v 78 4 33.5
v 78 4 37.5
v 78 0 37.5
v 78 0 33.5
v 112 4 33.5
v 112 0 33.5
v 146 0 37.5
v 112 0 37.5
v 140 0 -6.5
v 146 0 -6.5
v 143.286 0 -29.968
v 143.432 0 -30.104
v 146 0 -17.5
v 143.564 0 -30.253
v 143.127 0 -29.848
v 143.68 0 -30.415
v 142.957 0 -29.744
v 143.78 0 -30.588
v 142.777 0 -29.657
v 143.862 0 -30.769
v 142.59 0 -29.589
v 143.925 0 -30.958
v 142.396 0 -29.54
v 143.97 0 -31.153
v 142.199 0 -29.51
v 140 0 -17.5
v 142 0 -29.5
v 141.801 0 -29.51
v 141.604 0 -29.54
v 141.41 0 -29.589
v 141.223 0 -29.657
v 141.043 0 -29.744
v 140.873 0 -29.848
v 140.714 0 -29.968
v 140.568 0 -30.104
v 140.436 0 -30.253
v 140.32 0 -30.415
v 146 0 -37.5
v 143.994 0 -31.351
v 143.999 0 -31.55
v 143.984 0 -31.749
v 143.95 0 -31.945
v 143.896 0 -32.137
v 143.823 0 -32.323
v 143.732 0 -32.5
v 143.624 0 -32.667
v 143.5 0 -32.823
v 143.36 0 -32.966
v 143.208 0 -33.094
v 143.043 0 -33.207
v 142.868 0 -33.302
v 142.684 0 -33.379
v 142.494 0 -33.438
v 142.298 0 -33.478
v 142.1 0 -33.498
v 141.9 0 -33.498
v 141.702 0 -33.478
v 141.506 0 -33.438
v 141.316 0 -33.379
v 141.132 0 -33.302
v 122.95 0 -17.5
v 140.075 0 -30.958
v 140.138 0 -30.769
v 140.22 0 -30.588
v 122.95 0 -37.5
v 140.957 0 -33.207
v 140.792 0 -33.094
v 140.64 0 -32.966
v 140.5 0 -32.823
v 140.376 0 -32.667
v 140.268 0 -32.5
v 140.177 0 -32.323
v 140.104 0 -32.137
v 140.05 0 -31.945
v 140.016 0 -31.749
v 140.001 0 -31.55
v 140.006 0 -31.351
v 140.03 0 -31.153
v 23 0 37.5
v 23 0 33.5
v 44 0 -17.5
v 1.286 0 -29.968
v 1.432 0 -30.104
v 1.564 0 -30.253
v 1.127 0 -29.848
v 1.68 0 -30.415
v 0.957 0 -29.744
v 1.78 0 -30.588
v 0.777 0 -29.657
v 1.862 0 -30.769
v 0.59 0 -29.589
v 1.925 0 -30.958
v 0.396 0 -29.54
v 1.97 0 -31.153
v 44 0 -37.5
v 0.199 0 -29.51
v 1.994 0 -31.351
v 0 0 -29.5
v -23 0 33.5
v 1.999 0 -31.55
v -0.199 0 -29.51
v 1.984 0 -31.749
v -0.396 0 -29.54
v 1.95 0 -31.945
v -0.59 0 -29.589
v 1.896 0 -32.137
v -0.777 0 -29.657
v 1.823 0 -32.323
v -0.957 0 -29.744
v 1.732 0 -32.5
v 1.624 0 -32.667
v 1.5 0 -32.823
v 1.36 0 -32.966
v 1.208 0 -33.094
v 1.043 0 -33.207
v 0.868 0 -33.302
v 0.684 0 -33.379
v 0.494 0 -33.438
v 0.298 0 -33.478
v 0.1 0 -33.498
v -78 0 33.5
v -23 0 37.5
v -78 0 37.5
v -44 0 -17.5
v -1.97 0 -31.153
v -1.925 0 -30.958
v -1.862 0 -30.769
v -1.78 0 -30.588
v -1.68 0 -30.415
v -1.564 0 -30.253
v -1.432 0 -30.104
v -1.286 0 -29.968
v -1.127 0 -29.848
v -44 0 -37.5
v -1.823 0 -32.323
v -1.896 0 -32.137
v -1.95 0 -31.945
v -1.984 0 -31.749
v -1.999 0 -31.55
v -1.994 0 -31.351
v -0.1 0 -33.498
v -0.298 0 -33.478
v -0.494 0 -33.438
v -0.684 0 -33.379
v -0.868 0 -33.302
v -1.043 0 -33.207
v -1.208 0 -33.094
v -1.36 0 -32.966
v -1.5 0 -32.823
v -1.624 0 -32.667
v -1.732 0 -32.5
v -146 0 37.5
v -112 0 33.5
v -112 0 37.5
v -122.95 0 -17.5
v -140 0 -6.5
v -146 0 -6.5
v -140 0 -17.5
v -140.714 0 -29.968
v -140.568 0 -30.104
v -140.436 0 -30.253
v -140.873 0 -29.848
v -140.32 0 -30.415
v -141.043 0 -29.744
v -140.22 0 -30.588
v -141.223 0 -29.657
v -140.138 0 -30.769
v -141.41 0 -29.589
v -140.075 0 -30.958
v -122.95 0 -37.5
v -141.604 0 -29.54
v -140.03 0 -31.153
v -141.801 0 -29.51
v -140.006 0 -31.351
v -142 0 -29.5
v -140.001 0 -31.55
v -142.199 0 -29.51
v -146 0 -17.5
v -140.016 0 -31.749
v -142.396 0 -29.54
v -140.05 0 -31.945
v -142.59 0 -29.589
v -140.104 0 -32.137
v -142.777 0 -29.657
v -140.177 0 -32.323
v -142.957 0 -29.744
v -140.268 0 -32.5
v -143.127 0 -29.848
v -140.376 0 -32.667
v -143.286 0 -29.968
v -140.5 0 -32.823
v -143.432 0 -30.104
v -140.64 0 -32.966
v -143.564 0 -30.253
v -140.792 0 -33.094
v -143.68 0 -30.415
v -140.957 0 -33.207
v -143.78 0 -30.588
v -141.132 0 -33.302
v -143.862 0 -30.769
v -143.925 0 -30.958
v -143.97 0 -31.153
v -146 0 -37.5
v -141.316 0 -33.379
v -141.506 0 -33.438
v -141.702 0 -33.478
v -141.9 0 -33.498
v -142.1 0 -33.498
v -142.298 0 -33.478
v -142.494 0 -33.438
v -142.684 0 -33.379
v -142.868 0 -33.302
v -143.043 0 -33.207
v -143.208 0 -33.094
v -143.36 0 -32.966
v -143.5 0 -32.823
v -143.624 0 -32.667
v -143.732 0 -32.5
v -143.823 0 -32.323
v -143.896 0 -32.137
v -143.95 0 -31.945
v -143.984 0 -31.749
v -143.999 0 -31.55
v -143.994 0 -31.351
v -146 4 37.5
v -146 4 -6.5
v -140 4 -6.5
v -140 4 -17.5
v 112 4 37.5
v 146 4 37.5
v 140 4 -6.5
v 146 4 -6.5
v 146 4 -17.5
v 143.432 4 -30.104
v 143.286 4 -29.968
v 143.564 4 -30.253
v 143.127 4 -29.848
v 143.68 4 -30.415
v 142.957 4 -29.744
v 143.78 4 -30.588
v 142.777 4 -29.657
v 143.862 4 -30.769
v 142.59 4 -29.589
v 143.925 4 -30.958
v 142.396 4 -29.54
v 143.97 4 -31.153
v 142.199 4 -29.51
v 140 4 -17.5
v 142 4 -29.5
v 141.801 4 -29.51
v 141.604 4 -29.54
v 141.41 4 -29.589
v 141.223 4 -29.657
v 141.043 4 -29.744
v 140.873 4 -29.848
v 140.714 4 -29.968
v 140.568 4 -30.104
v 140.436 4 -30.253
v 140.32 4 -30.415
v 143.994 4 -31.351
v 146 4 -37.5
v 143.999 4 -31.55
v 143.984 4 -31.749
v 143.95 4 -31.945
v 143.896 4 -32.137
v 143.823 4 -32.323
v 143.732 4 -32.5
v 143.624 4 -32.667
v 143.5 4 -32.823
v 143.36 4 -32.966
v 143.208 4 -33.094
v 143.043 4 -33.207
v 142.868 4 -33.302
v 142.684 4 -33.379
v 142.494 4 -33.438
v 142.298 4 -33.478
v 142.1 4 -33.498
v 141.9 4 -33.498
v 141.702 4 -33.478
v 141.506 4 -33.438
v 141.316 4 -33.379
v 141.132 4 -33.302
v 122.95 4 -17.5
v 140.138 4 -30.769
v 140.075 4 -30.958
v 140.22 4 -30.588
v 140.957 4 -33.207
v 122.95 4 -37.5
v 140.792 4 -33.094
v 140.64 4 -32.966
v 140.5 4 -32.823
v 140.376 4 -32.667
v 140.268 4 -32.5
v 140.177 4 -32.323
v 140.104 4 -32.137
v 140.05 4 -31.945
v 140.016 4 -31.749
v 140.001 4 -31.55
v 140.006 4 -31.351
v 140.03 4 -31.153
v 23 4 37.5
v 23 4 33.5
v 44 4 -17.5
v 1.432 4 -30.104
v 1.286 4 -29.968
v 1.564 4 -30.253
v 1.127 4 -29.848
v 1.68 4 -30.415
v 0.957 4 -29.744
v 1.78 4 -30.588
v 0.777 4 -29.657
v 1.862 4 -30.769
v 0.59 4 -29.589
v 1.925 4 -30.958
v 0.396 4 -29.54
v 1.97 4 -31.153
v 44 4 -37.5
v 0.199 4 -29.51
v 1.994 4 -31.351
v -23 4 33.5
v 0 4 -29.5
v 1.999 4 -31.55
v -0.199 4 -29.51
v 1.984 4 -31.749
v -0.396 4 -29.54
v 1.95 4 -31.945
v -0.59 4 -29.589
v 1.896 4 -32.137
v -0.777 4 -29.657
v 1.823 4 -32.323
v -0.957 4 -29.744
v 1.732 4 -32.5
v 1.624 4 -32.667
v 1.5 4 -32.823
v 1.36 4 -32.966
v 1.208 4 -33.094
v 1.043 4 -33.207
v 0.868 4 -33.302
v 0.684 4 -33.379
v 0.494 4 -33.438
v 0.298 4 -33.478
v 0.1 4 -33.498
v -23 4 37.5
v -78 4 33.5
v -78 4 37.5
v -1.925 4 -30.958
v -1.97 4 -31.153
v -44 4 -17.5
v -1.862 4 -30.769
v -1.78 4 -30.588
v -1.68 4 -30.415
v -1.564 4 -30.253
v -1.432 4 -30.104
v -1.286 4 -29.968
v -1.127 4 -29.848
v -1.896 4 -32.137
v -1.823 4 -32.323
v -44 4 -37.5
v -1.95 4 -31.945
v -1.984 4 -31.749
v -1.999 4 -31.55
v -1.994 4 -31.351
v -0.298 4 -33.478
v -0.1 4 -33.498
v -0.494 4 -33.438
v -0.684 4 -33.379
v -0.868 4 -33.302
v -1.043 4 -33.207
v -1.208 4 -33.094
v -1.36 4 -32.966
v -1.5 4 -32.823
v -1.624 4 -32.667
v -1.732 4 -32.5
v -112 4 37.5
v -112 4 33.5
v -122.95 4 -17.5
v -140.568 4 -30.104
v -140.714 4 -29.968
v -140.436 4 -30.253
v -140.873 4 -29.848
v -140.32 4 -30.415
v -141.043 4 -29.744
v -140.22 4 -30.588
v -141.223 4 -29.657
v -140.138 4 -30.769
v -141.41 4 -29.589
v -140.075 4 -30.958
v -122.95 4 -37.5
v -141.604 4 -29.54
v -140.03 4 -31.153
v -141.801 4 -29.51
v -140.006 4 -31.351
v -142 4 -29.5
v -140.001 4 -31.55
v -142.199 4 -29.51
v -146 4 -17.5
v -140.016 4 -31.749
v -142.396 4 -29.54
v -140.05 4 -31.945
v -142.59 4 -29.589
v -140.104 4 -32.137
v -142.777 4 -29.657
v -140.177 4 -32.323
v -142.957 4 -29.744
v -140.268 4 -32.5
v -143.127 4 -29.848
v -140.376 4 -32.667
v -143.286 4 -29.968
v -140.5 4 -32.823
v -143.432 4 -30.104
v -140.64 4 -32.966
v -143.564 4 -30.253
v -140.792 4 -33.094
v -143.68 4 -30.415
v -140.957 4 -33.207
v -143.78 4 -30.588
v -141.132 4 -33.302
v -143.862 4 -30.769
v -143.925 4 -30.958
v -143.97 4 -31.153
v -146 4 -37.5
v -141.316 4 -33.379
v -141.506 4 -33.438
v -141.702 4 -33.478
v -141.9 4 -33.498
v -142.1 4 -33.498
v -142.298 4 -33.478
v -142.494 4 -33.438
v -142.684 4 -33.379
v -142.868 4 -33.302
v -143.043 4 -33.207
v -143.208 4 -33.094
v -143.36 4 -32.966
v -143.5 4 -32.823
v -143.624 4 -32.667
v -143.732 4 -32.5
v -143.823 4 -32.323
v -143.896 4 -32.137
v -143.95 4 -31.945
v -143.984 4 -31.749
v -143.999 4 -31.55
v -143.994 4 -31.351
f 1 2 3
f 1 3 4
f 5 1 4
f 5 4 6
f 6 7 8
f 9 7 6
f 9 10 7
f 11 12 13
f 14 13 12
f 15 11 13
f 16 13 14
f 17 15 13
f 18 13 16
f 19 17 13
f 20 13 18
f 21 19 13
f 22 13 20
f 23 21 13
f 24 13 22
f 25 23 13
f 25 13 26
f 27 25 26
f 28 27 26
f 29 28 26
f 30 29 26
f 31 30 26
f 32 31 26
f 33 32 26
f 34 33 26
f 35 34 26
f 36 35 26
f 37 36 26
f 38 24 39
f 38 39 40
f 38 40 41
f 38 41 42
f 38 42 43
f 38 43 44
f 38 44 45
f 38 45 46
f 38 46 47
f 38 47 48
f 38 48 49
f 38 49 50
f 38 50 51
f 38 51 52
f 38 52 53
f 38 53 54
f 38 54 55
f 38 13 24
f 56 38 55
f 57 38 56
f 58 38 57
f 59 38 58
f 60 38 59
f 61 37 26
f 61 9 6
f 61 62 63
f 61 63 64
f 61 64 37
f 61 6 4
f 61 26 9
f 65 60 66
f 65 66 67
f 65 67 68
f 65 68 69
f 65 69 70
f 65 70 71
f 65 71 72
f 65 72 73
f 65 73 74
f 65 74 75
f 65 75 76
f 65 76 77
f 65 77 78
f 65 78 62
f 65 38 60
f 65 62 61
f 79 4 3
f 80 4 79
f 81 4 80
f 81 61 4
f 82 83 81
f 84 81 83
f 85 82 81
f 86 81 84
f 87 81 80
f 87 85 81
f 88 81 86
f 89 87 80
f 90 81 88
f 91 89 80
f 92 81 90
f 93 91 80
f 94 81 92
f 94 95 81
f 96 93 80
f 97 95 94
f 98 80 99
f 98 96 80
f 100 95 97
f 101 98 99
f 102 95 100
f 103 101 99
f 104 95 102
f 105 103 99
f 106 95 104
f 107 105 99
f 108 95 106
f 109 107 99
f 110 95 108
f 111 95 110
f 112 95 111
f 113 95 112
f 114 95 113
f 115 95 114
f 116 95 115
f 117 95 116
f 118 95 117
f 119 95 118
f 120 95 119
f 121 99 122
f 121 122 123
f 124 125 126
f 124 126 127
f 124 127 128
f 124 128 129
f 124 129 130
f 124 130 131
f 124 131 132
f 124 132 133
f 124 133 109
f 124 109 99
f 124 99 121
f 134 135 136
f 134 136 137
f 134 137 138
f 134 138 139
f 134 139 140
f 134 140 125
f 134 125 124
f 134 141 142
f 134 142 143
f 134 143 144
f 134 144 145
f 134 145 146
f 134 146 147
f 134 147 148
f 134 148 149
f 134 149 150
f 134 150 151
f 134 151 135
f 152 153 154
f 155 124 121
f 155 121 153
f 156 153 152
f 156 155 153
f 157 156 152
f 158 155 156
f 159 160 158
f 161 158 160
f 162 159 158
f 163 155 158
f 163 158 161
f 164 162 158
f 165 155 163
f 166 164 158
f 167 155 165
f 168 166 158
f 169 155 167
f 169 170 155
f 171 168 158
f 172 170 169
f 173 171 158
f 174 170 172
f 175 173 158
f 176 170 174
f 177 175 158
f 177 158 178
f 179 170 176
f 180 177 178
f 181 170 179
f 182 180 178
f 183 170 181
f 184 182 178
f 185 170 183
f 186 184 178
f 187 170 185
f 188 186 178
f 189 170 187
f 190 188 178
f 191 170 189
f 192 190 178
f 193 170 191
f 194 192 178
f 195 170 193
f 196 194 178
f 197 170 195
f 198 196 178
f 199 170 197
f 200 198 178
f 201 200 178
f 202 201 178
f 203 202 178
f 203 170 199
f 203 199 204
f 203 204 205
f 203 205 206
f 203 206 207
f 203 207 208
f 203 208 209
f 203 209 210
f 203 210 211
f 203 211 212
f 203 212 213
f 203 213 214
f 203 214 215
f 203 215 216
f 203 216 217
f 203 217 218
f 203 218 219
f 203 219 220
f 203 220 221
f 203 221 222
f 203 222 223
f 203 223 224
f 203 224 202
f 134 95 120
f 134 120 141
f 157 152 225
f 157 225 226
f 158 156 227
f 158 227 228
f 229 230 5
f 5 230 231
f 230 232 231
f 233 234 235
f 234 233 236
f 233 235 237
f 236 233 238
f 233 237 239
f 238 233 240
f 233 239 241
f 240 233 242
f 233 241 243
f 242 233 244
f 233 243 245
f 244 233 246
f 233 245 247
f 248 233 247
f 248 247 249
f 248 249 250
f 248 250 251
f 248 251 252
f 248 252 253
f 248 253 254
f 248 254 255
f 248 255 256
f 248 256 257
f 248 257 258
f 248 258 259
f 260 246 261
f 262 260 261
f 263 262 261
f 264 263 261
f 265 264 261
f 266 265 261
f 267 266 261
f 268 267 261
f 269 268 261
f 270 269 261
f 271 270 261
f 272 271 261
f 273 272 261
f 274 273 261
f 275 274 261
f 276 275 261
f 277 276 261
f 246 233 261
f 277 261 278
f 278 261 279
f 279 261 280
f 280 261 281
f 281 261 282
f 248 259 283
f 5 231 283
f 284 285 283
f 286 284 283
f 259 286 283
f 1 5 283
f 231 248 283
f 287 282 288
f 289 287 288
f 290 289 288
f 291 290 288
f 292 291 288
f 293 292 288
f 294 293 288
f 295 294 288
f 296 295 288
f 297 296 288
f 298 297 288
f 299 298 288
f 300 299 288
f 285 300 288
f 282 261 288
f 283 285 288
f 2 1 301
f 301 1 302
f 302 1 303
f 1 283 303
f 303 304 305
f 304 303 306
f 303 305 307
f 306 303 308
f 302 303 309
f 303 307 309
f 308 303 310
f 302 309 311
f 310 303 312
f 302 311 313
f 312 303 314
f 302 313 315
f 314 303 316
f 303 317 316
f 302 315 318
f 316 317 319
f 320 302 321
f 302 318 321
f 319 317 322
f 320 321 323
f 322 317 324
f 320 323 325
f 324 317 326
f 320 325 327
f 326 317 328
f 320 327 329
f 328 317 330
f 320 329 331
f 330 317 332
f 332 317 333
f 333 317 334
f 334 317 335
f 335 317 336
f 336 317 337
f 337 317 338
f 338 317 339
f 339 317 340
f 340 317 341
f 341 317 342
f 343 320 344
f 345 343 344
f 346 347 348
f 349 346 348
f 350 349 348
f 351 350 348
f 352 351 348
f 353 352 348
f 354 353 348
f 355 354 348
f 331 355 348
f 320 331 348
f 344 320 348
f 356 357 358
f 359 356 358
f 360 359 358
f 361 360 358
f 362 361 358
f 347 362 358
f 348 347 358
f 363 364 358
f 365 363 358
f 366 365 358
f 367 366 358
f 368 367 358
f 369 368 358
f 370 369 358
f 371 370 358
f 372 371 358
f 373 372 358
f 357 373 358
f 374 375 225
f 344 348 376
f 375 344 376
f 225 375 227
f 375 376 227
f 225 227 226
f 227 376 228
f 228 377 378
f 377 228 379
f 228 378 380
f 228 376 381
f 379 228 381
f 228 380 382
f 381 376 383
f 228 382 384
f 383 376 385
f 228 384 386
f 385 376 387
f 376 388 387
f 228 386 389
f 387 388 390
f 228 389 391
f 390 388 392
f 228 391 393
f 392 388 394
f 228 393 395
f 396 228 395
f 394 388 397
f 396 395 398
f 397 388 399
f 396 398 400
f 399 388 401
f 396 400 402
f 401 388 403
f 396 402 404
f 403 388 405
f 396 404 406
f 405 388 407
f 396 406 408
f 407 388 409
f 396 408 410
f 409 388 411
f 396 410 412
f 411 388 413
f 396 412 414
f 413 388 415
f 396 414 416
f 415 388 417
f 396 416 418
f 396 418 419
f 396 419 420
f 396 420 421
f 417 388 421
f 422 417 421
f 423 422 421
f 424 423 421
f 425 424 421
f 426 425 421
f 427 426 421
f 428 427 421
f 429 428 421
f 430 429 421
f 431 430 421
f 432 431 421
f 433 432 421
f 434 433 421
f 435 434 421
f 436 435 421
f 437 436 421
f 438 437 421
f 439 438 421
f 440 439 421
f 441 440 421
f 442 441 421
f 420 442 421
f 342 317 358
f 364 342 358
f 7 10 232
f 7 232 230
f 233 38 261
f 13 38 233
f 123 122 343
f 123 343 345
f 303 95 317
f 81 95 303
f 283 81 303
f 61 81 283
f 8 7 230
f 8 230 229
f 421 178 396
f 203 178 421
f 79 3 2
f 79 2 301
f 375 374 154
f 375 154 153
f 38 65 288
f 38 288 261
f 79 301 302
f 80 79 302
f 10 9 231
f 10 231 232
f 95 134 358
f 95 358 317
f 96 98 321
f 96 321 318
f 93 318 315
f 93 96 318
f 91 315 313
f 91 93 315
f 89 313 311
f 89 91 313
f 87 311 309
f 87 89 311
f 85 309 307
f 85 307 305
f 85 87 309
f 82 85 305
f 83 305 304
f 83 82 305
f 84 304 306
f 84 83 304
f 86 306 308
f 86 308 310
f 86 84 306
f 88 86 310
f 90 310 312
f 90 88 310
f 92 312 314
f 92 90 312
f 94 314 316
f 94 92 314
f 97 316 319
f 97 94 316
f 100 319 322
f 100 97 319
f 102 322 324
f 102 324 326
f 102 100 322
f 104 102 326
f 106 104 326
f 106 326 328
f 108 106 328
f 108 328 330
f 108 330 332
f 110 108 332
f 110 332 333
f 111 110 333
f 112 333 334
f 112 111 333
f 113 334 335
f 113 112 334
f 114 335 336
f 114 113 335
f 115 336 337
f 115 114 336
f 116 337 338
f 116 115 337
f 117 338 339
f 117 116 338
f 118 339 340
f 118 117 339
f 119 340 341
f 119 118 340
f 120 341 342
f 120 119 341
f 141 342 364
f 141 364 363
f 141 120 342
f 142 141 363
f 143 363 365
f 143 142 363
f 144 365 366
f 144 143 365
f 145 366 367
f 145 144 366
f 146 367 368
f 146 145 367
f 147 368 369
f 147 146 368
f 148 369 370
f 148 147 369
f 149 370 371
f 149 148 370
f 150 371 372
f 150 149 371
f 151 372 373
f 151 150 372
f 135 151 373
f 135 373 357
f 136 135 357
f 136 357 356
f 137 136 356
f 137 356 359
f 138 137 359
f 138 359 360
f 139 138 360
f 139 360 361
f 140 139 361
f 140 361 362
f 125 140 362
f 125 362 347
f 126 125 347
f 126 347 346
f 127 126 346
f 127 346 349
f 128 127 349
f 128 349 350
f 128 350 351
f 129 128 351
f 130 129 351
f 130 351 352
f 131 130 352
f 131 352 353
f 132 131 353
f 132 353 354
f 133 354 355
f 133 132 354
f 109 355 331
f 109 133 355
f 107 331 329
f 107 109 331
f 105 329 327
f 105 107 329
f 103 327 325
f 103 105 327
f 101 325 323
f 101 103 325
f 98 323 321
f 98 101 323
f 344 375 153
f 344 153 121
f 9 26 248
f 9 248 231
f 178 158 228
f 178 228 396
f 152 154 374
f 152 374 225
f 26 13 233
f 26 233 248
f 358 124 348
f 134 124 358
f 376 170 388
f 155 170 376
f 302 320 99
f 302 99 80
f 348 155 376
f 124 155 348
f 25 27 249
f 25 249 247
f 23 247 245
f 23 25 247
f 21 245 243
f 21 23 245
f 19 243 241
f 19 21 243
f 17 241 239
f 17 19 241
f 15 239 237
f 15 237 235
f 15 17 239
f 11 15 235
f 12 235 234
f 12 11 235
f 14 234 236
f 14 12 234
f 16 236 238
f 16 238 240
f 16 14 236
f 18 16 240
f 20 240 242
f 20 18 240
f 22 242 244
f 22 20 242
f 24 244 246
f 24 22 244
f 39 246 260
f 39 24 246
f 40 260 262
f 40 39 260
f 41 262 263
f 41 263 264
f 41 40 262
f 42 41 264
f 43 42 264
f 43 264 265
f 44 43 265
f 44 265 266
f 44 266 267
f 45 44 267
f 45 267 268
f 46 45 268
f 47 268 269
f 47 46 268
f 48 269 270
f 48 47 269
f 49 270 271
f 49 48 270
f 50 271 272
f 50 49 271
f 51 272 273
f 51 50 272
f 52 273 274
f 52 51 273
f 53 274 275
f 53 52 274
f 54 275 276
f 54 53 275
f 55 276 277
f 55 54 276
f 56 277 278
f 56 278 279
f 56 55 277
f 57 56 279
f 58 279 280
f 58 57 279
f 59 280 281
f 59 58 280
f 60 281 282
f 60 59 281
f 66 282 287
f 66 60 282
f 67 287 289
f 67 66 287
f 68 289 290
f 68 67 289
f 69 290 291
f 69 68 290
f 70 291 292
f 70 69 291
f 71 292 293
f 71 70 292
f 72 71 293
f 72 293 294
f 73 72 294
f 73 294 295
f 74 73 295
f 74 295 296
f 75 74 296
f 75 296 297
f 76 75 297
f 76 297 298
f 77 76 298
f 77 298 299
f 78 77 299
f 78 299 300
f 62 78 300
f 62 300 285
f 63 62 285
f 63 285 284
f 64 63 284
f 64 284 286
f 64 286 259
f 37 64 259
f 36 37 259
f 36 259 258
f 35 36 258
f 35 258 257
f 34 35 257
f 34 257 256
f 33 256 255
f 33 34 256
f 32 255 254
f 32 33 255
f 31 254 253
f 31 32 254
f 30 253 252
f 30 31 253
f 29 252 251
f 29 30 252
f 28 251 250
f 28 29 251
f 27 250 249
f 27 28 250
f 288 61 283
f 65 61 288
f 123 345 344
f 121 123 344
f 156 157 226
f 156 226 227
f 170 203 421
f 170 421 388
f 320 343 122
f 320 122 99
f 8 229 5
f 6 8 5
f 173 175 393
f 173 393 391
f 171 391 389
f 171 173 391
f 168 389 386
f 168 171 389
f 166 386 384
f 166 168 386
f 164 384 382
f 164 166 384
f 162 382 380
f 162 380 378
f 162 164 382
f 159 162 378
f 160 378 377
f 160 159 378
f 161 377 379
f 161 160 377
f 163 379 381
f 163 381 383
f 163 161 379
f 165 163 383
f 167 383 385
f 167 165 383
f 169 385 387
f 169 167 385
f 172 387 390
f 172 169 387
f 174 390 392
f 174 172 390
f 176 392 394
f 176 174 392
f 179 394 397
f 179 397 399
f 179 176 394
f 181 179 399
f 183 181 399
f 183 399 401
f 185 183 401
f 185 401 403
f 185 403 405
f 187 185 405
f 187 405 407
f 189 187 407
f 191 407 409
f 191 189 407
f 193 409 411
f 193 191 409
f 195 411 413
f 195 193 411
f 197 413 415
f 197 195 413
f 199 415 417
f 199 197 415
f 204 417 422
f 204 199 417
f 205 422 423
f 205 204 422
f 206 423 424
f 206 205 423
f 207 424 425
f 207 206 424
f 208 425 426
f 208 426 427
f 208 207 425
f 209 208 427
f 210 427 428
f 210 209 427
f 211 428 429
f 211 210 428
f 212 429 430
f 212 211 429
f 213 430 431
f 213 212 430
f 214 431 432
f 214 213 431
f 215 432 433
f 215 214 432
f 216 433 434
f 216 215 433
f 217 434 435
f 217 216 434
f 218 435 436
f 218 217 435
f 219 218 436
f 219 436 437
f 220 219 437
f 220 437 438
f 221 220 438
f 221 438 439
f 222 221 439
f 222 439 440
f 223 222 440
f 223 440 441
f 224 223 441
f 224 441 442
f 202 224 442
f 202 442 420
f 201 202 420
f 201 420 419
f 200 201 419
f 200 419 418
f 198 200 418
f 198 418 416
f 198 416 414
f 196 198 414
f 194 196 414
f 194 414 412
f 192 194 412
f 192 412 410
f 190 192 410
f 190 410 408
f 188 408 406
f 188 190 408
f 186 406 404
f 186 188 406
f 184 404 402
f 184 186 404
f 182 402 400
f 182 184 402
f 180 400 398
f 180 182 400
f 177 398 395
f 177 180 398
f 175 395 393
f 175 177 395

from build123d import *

# Parameters (mm, degrees)
SKETCH1_R           = 2
BOSS_EXTRUDE1_DEPTH = 4
SKETCH2_W           = 34
SKETCH2_H           = 4
SKETCH2_W_2         = 46
CUT_EXTRUDE1_DEPTH  = 151.792075389


with BuildPart() as part:
    # Sketch1 → Boss-Extrude1 (new body)
    with BuildSketch(Plane(origin=(0, 0, 0), x_dir=(1, 0, 0), z_dir=(0, 1, 0))):
        Polygon((146, -37.5), (-146, -37.5), (-146, 6.5), (-140, 6.5), (-140, 17.5), (-146, 17.5), (-146, 37.5), (-122.95, 37.5), (-122.95, 17.5), (-44, 17.5), (-44, 37.5), (44, 37.5), (44, 17.5), (122.95, 17.5), (122.95, 37.5), (146, 37.5), (146, 17.5), (140, 17.5), (140, 6.5), (146, 6.5), align=None)
        with Locations(Location((-142, 31.5, 0), (0, 0, 270))):
            Circle(SKETCH1_R, mode=Mode.SUBTRACT)
        with Locations(Location((142, 31.5, 0), (0, 0, 270))):
            Circle(SKETCH1_R, mode=Mode.SUBTRACT)
        with Locations(Location((0, 31.5, 0), (0, 0, 270))):
            Circle(SKETCH1_R, mode=Mode.SUBTRACT)
    extrude(amount=BOSS_EXTRUDE1_DEPTH)

    # Sketch2 → Cut-Extrude1 (cut, through all)
    with BuildSketch(Plane(origin=(0, 4, 0), x_dir=(1, 0, 0), z_dir=(0, 1, 0))):
        with Locations((95, -35.5)):
            Rectangle(SKETCH2_W, SKETCH2_H)
        with Locations((0, -35.5)):
            Rectangle(SKETCH2_W_2, SKETCH2_H)
        with Locations((-95, -35.5)):
            Rectangle(SKETCH2_W, SKETCH2_H)
    extrude(amount=-CUT_EXTRUDE1_DEPTH, mode=Mode.SUBTRACT)


solid = part.part
